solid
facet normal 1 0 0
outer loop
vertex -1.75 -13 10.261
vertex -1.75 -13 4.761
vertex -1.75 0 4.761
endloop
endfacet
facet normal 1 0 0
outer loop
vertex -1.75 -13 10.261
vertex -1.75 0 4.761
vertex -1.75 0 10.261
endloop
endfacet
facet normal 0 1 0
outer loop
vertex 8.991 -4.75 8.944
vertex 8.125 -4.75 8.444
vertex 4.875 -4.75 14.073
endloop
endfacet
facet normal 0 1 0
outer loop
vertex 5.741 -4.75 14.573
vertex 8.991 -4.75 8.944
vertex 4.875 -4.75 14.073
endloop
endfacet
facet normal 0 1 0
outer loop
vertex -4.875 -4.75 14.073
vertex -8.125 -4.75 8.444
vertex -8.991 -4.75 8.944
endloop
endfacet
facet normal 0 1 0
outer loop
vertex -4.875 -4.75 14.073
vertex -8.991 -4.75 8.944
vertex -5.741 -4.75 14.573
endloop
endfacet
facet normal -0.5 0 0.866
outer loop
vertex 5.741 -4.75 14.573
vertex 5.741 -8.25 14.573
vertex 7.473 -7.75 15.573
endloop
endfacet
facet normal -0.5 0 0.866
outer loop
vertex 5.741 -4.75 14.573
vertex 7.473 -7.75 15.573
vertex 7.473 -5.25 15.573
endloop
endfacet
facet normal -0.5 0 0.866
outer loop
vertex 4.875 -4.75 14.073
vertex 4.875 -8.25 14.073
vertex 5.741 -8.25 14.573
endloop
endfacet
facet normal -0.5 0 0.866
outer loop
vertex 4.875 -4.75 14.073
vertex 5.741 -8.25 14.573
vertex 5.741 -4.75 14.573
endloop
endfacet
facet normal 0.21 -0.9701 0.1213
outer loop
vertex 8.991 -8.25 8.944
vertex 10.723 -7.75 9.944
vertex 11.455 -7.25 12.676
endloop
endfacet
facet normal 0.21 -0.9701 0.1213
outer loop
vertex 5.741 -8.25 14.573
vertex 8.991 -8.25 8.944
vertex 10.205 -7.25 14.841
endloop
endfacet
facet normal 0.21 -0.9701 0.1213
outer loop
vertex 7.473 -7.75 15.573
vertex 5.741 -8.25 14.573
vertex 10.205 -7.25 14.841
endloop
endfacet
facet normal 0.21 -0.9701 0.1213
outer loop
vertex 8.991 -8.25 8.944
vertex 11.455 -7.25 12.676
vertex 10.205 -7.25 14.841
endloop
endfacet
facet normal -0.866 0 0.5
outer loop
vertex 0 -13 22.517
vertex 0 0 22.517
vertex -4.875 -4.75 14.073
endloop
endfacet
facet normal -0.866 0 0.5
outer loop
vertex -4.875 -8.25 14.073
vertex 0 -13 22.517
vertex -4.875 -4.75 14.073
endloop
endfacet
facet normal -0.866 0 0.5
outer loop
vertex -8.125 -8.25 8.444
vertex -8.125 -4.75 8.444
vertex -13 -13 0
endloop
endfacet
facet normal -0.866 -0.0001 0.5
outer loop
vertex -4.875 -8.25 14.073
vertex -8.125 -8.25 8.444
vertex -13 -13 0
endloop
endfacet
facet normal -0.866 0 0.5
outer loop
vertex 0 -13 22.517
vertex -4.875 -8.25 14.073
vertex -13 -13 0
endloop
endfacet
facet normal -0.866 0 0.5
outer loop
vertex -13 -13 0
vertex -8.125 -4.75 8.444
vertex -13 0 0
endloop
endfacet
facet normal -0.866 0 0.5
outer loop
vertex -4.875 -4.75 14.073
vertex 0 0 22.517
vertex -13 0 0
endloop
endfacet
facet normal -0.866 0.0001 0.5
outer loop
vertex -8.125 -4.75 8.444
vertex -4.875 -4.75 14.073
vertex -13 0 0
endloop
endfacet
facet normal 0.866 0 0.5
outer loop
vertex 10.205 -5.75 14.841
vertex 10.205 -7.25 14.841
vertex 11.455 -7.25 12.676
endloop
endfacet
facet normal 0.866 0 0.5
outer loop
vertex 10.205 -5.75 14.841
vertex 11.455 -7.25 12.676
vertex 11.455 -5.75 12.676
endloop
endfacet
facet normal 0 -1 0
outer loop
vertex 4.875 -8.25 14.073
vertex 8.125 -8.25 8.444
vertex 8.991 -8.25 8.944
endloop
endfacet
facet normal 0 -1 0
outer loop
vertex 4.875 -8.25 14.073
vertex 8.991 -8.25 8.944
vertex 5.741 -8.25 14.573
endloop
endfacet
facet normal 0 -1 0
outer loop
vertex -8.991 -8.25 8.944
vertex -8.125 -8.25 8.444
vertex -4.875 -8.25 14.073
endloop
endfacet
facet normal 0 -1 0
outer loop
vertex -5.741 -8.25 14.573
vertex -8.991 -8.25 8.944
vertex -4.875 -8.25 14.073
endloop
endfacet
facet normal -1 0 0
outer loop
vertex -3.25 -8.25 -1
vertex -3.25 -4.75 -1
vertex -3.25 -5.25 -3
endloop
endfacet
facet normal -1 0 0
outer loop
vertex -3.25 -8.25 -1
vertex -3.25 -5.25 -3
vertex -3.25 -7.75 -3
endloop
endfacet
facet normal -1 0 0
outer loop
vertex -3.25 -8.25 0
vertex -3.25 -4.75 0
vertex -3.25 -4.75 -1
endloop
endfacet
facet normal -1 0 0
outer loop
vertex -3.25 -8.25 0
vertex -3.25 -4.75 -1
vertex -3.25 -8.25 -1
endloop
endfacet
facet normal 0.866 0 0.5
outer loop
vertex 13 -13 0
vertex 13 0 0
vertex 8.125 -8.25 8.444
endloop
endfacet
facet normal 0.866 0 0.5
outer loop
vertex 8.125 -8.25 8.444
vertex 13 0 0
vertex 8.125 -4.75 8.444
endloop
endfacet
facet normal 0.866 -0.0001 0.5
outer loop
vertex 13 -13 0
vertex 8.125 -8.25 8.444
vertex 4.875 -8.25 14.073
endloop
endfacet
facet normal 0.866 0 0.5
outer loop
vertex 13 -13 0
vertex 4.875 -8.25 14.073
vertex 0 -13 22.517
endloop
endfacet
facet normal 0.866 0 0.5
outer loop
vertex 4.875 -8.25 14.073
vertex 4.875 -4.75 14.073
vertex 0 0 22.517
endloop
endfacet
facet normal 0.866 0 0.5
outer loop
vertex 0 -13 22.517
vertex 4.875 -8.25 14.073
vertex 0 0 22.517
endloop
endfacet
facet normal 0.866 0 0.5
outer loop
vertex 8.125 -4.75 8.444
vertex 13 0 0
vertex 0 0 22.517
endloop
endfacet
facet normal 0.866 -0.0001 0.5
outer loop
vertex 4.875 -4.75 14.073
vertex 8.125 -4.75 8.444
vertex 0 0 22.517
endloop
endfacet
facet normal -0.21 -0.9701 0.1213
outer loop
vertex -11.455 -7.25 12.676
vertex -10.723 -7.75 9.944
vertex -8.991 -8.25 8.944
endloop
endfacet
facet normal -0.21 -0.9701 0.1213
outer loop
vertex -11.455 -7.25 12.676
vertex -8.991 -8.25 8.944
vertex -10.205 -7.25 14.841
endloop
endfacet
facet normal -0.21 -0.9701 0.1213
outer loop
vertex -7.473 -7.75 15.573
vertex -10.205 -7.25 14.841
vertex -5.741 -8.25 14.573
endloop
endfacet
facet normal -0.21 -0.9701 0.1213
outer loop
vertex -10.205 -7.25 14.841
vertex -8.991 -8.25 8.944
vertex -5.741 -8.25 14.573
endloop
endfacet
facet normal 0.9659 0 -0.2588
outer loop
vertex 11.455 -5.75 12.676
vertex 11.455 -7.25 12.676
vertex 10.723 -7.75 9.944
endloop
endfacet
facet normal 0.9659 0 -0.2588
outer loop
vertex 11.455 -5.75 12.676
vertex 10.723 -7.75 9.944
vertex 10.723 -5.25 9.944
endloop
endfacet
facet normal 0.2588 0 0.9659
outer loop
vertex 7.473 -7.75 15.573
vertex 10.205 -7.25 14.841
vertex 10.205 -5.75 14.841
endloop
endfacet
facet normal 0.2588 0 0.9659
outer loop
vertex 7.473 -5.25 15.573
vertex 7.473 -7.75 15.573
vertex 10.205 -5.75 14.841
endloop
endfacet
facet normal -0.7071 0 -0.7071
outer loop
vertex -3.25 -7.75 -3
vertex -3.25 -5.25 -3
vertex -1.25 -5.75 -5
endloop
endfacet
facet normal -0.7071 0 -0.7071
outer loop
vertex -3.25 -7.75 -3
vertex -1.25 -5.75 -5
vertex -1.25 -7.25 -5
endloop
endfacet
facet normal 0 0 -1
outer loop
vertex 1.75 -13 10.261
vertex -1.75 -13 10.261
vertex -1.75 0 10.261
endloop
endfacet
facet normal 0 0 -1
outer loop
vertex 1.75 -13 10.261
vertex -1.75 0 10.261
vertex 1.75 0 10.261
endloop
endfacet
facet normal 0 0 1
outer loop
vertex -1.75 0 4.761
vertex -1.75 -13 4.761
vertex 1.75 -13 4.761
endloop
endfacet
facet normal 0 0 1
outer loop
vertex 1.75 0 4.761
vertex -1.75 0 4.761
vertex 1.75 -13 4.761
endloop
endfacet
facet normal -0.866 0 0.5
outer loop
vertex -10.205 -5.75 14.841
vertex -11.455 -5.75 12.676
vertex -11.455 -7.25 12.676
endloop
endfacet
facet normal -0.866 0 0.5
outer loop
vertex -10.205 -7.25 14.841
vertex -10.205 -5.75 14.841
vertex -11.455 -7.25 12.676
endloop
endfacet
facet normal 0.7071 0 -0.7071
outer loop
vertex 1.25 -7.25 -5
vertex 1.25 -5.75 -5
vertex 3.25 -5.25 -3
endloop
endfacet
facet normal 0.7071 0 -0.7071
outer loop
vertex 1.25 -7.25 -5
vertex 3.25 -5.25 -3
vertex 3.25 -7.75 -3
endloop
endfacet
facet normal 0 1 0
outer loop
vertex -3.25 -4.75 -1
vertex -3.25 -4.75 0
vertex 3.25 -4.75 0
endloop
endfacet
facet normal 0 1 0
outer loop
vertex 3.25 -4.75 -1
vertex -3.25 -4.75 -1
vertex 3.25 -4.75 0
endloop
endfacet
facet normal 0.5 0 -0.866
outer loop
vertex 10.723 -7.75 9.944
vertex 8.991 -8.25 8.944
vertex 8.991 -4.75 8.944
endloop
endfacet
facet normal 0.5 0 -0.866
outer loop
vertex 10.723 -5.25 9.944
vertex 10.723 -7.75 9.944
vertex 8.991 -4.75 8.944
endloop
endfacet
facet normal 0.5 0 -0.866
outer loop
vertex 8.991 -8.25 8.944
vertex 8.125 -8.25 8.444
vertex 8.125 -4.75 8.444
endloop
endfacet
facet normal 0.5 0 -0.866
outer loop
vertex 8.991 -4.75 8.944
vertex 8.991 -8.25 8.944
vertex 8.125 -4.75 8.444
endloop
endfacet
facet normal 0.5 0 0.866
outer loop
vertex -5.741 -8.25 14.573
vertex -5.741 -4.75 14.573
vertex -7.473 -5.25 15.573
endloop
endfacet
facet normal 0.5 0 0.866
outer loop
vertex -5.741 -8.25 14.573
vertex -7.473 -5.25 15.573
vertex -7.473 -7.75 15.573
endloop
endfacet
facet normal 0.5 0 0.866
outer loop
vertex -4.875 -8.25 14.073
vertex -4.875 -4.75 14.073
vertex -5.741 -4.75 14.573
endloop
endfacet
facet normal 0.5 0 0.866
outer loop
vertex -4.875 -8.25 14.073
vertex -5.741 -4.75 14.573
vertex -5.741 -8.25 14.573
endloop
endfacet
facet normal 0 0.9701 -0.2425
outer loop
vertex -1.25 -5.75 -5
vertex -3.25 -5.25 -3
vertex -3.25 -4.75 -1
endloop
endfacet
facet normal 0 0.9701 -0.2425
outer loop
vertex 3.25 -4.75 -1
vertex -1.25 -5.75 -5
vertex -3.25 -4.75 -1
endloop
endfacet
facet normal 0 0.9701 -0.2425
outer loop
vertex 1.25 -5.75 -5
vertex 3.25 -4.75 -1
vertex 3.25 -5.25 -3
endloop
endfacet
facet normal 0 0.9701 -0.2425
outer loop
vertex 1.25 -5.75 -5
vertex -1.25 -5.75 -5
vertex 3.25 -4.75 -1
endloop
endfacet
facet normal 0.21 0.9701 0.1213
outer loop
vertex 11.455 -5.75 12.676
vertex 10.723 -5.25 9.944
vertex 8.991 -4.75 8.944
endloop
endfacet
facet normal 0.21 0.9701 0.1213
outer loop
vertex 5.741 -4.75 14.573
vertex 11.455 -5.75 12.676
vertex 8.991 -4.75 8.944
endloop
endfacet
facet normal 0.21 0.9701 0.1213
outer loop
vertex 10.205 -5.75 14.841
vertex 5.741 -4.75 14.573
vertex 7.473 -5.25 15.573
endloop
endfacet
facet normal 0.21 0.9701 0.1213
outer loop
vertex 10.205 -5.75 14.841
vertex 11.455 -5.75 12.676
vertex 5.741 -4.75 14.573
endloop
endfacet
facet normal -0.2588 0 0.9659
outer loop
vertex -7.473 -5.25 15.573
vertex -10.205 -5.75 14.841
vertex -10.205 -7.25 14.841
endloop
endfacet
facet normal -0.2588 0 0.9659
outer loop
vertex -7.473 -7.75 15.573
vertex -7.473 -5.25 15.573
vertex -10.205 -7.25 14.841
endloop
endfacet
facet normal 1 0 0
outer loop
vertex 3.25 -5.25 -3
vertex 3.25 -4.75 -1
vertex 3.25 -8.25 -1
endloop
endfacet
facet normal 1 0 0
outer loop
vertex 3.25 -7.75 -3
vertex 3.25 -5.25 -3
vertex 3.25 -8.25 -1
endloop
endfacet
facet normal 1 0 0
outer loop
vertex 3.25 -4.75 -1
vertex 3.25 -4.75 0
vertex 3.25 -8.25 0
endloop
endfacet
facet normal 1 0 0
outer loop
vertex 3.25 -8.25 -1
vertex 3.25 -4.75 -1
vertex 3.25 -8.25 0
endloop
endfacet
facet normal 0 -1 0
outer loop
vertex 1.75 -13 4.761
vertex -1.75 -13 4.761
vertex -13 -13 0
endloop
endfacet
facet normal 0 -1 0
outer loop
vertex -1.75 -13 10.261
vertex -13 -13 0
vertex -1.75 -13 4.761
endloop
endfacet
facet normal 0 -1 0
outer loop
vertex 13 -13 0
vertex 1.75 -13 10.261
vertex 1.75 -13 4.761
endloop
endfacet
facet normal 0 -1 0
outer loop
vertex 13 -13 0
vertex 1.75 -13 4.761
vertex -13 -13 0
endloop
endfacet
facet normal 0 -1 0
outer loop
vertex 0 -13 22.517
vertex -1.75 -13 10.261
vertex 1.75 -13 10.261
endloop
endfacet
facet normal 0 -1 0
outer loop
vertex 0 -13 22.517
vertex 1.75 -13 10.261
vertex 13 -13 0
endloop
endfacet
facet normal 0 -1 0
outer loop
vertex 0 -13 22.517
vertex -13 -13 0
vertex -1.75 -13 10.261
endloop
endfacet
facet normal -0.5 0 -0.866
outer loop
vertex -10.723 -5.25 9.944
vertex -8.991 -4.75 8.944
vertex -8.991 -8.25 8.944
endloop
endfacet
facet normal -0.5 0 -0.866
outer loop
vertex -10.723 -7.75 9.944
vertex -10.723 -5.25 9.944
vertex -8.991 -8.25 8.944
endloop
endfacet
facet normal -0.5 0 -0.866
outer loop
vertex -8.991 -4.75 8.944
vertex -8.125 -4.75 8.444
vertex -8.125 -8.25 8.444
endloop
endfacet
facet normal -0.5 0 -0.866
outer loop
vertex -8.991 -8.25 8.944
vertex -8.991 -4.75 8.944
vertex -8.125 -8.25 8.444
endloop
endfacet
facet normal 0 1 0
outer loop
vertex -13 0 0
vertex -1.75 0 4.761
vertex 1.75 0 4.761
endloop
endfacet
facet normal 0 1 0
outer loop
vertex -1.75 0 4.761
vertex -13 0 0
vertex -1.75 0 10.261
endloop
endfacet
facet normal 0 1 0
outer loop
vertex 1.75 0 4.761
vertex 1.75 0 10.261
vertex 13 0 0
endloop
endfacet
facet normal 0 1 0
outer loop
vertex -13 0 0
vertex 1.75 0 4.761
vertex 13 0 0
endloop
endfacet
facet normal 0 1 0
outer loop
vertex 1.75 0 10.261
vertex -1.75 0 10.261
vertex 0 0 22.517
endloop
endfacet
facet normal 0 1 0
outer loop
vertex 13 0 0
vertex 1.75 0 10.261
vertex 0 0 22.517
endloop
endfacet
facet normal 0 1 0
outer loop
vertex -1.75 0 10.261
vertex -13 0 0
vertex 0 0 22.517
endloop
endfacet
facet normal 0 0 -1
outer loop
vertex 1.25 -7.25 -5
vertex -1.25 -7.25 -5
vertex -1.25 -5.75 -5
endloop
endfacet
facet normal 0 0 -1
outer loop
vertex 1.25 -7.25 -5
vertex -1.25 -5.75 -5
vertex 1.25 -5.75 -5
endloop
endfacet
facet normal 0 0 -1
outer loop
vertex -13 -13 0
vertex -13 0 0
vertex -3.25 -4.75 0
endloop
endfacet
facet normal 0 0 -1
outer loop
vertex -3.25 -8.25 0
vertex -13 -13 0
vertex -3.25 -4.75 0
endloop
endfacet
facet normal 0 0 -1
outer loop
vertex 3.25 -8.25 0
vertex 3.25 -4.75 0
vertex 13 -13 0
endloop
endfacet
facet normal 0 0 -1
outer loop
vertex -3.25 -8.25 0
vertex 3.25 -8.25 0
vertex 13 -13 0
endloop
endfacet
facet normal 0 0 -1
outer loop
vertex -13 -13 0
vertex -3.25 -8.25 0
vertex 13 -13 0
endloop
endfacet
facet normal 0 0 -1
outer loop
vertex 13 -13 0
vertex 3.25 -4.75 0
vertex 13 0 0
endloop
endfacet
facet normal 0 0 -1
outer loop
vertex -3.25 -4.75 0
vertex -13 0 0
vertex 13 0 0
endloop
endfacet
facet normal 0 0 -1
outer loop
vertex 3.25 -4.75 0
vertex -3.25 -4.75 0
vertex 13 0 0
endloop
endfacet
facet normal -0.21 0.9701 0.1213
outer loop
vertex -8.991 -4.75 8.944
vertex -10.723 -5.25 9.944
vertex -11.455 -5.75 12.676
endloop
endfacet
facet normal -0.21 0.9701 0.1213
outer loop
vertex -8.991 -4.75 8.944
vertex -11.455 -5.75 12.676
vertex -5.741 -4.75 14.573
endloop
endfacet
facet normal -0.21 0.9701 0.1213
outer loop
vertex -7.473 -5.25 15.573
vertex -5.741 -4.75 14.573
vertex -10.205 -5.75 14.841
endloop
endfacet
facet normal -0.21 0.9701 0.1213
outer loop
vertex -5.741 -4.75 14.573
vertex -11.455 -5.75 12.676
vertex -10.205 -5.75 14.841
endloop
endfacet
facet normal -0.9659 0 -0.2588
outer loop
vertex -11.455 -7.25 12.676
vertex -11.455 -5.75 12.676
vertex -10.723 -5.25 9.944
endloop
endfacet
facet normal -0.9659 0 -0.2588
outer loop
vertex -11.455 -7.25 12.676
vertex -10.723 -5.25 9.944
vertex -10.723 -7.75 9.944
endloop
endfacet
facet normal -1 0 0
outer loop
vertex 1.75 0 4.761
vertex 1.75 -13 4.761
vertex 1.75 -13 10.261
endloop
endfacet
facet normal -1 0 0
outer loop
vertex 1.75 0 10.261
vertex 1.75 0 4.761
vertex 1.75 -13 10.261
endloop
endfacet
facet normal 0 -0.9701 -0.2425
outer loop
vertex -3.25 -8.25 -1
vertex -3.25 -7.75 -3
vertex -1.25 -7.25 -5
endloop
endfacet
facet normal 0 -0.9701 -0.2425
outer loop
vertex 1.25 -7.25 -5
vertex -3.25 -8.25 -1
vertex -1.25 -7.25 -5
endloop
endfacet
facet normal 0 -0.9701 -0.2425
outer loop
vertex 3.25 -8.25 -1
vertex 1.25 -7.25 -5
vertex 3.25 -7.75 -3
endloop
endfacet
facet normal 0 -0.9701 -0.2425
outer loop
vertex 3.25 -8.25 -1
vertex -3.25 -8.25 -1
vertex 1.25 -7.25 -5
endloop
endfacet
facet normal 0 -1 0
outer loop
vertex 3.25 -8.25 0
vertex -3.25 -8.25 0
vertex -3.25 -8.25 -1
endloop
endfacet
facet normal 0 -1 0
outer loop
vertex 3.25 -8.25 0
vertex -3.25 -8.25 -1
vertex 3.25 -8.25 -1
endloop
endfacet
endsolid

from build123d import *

# Parameters (mm, degrees)
F1_DEPTH    = 13
F2_W        = 3.5
F2_H        = 5.5
F3_DEPTH    = 13.001
F4_W        = 3.5
F4_H        = 6.5
F6_DEPTH    = 5
F5_W        = 3.5
F5_H        = 6.5
F7_DEPTH    = 5
F8_W        = 6.5
F8_H        = 3.5
F9_DEPTH    = 5
F10_SIZE2   = 1
F10_SIZE    = 4
F10_2_SIZE2 = 1
F10_2_SIZE  = 4
F10_3_SIZE2 = 1
F10_3_SIZE  = 4
F10_4_SIZE2 = 1
F10_4_SIZE  = 4
F11_SIZE2   = 4
F11_SIZE    = 1
F11_2_SIZE2 = 4
F11_2_SIZE  = 1
F12_SIZE    = 2


with BuildPart() as f1:
    # F0 (on Front) → F1 (new body)
    with BuildSketch(Plane.XZ):
        Polygon((0, 7.5055534995), (0, 22.5166604984), (-13, 0), align=None)
        Polygon((13, 0), (0, 22.5166604984), (0, 7.5055534995), align=None)
        Polygon((0, 7.5055534995), (-13, 0), (13, 0), align=None)
    extrude(amount=F1_DEPTH)

    # F2 (on face) → F3 (cut, through all)
    with BuildSketch(Plane.XZ.offset(13)):
        with Locations((0, 7.5106434524)):
            Rectangle(F2_W, F2_H)
    extrude(amount=-F3_DEPTH, mode=Mode.SUBTRACT)

    # F4 (on face) → F6 (join)
    with BuildSketch(Plane(origin=(9.75, 0, 5.6291651246), x_dir=(0, 1, 0), z_dir=(0.8660254038, 0, 0.5))):
        with Locations((-6.5, 6.5)):
            Rectangle(F4_W, F4_H)
    extrude(amount=F6_DEPTH)

    # F5 (on face) → F7 (join)
    with BuildSketch(Plane(origin=(-9.75, 0, 5.6291651246), x_dir=(0, -1, 0), z_dir=(-0.8660254038, 0, 0.5))):
        with Locations((6.5, 6.5)):
            Rectangle(F5_W, F5_H)
    extrude(amount=F7_DEPTH)

    # F8 (on face) → F9 (join)
    with BuildSketch(Plane(origin=(0, 0, 0), x_dir=(1, 0, 0), z_dir=(0, 0, -1))):
        with Locations((0, 6.5)):
            Rectangle(F8_W, F8_H)
    extrude(amount=F9_DEPTH)

    # F10
    f10_edges = [f1.edges().sort_by_distance(p)[0] for p in [
        (10.830127, -8.25, 13.75833),
    ]]
    f10_side = f1.faces().sort_by_distance((8.665064, -8.25, 12.50833))[0]
    chamfer(f10_edges, length=F10_SIZE, length2=F10_SIZE2, reference=f10_side)

    # F10#2
    f10_2_edges = [f1.edges().sort_by_distance(p)[0] for p in [
        (10.830127, -4.75, 13.75833),
    ]]
    f10_2_side = f1.faces().sort_by_distance((8.665064, -4.75, 12.50833))[0]
    chamfer(f10_2_edges, length=F10_2_SIZE, length2=F10_2_SIZE2, reference=f10_2_side)

    # F10#3
    f10_3_edges = [f1.edges().sort_by_distance(p)[0] for p in [
        (0, -4.75, -5),
    ]]
    f10_3_side = f1.faces().sort_by_distance((0, -4.75, -2.5))[0]
    chamfer(f10_3_edges, length=F10_3_SIZE, length2=F10_3_SIZE2, reference=f10_3_side)

    # F10#4
    f10_4_edges = [f1.edges().sort_by_distance(p)[0] for p in [
        (-10.830127, -4.75, 13.75833),
    ]]
    f10_4_side = f1.faces().sort_by_distance((-8.665064, -4.75, 12.50833))[0]
    chamfer(f10_4_edges, length=F10_4_SIZE, length2=F10_4_SIZE2, reference=f10_4_side)

    # F11
    f11_edges = [f1.edges().sort_by_distance(p)[0] for p in [
        (-10.830127, -8.25, 13.75833),
    ]]
    f11_side = f1.faces().sort_by_distance((-10.830127, -7, 13.75833))[0]
    chamfer(f11_edges, length=F11_SIZE, length2=F11_SIZE2, reference=f11_side)

    # F11#2
    f11_2_edges = [f1.edges().sort_by_distance(p)[0] for p in [
        (0, -8.25, -5),
    ]]
    f11_2_side = f1.faces().sort_by_distance((0, -7, -5))[0]
    chamfer(f11_2_edges, length=F11_2_SIZE, length2=F11_2_SIZE2, reference=f11_2_side)

    # F12
    f12_edges = [f1.edges().sort_by_distance(p)[0] for p in [
        (-9.205127, -6.5, 16.572913),
        (-12.455127, -6.5, 10.943748),
        (9.205127, -6.5, 16.572913),
        (12.455127, -6.5, 10.943748),
        (-3.25, -6.5, -5),
        (3.25, -6.5, -5),
    ]]
    chamfer(f12_edges, length=F12_SIZE)


solid = f1.part
